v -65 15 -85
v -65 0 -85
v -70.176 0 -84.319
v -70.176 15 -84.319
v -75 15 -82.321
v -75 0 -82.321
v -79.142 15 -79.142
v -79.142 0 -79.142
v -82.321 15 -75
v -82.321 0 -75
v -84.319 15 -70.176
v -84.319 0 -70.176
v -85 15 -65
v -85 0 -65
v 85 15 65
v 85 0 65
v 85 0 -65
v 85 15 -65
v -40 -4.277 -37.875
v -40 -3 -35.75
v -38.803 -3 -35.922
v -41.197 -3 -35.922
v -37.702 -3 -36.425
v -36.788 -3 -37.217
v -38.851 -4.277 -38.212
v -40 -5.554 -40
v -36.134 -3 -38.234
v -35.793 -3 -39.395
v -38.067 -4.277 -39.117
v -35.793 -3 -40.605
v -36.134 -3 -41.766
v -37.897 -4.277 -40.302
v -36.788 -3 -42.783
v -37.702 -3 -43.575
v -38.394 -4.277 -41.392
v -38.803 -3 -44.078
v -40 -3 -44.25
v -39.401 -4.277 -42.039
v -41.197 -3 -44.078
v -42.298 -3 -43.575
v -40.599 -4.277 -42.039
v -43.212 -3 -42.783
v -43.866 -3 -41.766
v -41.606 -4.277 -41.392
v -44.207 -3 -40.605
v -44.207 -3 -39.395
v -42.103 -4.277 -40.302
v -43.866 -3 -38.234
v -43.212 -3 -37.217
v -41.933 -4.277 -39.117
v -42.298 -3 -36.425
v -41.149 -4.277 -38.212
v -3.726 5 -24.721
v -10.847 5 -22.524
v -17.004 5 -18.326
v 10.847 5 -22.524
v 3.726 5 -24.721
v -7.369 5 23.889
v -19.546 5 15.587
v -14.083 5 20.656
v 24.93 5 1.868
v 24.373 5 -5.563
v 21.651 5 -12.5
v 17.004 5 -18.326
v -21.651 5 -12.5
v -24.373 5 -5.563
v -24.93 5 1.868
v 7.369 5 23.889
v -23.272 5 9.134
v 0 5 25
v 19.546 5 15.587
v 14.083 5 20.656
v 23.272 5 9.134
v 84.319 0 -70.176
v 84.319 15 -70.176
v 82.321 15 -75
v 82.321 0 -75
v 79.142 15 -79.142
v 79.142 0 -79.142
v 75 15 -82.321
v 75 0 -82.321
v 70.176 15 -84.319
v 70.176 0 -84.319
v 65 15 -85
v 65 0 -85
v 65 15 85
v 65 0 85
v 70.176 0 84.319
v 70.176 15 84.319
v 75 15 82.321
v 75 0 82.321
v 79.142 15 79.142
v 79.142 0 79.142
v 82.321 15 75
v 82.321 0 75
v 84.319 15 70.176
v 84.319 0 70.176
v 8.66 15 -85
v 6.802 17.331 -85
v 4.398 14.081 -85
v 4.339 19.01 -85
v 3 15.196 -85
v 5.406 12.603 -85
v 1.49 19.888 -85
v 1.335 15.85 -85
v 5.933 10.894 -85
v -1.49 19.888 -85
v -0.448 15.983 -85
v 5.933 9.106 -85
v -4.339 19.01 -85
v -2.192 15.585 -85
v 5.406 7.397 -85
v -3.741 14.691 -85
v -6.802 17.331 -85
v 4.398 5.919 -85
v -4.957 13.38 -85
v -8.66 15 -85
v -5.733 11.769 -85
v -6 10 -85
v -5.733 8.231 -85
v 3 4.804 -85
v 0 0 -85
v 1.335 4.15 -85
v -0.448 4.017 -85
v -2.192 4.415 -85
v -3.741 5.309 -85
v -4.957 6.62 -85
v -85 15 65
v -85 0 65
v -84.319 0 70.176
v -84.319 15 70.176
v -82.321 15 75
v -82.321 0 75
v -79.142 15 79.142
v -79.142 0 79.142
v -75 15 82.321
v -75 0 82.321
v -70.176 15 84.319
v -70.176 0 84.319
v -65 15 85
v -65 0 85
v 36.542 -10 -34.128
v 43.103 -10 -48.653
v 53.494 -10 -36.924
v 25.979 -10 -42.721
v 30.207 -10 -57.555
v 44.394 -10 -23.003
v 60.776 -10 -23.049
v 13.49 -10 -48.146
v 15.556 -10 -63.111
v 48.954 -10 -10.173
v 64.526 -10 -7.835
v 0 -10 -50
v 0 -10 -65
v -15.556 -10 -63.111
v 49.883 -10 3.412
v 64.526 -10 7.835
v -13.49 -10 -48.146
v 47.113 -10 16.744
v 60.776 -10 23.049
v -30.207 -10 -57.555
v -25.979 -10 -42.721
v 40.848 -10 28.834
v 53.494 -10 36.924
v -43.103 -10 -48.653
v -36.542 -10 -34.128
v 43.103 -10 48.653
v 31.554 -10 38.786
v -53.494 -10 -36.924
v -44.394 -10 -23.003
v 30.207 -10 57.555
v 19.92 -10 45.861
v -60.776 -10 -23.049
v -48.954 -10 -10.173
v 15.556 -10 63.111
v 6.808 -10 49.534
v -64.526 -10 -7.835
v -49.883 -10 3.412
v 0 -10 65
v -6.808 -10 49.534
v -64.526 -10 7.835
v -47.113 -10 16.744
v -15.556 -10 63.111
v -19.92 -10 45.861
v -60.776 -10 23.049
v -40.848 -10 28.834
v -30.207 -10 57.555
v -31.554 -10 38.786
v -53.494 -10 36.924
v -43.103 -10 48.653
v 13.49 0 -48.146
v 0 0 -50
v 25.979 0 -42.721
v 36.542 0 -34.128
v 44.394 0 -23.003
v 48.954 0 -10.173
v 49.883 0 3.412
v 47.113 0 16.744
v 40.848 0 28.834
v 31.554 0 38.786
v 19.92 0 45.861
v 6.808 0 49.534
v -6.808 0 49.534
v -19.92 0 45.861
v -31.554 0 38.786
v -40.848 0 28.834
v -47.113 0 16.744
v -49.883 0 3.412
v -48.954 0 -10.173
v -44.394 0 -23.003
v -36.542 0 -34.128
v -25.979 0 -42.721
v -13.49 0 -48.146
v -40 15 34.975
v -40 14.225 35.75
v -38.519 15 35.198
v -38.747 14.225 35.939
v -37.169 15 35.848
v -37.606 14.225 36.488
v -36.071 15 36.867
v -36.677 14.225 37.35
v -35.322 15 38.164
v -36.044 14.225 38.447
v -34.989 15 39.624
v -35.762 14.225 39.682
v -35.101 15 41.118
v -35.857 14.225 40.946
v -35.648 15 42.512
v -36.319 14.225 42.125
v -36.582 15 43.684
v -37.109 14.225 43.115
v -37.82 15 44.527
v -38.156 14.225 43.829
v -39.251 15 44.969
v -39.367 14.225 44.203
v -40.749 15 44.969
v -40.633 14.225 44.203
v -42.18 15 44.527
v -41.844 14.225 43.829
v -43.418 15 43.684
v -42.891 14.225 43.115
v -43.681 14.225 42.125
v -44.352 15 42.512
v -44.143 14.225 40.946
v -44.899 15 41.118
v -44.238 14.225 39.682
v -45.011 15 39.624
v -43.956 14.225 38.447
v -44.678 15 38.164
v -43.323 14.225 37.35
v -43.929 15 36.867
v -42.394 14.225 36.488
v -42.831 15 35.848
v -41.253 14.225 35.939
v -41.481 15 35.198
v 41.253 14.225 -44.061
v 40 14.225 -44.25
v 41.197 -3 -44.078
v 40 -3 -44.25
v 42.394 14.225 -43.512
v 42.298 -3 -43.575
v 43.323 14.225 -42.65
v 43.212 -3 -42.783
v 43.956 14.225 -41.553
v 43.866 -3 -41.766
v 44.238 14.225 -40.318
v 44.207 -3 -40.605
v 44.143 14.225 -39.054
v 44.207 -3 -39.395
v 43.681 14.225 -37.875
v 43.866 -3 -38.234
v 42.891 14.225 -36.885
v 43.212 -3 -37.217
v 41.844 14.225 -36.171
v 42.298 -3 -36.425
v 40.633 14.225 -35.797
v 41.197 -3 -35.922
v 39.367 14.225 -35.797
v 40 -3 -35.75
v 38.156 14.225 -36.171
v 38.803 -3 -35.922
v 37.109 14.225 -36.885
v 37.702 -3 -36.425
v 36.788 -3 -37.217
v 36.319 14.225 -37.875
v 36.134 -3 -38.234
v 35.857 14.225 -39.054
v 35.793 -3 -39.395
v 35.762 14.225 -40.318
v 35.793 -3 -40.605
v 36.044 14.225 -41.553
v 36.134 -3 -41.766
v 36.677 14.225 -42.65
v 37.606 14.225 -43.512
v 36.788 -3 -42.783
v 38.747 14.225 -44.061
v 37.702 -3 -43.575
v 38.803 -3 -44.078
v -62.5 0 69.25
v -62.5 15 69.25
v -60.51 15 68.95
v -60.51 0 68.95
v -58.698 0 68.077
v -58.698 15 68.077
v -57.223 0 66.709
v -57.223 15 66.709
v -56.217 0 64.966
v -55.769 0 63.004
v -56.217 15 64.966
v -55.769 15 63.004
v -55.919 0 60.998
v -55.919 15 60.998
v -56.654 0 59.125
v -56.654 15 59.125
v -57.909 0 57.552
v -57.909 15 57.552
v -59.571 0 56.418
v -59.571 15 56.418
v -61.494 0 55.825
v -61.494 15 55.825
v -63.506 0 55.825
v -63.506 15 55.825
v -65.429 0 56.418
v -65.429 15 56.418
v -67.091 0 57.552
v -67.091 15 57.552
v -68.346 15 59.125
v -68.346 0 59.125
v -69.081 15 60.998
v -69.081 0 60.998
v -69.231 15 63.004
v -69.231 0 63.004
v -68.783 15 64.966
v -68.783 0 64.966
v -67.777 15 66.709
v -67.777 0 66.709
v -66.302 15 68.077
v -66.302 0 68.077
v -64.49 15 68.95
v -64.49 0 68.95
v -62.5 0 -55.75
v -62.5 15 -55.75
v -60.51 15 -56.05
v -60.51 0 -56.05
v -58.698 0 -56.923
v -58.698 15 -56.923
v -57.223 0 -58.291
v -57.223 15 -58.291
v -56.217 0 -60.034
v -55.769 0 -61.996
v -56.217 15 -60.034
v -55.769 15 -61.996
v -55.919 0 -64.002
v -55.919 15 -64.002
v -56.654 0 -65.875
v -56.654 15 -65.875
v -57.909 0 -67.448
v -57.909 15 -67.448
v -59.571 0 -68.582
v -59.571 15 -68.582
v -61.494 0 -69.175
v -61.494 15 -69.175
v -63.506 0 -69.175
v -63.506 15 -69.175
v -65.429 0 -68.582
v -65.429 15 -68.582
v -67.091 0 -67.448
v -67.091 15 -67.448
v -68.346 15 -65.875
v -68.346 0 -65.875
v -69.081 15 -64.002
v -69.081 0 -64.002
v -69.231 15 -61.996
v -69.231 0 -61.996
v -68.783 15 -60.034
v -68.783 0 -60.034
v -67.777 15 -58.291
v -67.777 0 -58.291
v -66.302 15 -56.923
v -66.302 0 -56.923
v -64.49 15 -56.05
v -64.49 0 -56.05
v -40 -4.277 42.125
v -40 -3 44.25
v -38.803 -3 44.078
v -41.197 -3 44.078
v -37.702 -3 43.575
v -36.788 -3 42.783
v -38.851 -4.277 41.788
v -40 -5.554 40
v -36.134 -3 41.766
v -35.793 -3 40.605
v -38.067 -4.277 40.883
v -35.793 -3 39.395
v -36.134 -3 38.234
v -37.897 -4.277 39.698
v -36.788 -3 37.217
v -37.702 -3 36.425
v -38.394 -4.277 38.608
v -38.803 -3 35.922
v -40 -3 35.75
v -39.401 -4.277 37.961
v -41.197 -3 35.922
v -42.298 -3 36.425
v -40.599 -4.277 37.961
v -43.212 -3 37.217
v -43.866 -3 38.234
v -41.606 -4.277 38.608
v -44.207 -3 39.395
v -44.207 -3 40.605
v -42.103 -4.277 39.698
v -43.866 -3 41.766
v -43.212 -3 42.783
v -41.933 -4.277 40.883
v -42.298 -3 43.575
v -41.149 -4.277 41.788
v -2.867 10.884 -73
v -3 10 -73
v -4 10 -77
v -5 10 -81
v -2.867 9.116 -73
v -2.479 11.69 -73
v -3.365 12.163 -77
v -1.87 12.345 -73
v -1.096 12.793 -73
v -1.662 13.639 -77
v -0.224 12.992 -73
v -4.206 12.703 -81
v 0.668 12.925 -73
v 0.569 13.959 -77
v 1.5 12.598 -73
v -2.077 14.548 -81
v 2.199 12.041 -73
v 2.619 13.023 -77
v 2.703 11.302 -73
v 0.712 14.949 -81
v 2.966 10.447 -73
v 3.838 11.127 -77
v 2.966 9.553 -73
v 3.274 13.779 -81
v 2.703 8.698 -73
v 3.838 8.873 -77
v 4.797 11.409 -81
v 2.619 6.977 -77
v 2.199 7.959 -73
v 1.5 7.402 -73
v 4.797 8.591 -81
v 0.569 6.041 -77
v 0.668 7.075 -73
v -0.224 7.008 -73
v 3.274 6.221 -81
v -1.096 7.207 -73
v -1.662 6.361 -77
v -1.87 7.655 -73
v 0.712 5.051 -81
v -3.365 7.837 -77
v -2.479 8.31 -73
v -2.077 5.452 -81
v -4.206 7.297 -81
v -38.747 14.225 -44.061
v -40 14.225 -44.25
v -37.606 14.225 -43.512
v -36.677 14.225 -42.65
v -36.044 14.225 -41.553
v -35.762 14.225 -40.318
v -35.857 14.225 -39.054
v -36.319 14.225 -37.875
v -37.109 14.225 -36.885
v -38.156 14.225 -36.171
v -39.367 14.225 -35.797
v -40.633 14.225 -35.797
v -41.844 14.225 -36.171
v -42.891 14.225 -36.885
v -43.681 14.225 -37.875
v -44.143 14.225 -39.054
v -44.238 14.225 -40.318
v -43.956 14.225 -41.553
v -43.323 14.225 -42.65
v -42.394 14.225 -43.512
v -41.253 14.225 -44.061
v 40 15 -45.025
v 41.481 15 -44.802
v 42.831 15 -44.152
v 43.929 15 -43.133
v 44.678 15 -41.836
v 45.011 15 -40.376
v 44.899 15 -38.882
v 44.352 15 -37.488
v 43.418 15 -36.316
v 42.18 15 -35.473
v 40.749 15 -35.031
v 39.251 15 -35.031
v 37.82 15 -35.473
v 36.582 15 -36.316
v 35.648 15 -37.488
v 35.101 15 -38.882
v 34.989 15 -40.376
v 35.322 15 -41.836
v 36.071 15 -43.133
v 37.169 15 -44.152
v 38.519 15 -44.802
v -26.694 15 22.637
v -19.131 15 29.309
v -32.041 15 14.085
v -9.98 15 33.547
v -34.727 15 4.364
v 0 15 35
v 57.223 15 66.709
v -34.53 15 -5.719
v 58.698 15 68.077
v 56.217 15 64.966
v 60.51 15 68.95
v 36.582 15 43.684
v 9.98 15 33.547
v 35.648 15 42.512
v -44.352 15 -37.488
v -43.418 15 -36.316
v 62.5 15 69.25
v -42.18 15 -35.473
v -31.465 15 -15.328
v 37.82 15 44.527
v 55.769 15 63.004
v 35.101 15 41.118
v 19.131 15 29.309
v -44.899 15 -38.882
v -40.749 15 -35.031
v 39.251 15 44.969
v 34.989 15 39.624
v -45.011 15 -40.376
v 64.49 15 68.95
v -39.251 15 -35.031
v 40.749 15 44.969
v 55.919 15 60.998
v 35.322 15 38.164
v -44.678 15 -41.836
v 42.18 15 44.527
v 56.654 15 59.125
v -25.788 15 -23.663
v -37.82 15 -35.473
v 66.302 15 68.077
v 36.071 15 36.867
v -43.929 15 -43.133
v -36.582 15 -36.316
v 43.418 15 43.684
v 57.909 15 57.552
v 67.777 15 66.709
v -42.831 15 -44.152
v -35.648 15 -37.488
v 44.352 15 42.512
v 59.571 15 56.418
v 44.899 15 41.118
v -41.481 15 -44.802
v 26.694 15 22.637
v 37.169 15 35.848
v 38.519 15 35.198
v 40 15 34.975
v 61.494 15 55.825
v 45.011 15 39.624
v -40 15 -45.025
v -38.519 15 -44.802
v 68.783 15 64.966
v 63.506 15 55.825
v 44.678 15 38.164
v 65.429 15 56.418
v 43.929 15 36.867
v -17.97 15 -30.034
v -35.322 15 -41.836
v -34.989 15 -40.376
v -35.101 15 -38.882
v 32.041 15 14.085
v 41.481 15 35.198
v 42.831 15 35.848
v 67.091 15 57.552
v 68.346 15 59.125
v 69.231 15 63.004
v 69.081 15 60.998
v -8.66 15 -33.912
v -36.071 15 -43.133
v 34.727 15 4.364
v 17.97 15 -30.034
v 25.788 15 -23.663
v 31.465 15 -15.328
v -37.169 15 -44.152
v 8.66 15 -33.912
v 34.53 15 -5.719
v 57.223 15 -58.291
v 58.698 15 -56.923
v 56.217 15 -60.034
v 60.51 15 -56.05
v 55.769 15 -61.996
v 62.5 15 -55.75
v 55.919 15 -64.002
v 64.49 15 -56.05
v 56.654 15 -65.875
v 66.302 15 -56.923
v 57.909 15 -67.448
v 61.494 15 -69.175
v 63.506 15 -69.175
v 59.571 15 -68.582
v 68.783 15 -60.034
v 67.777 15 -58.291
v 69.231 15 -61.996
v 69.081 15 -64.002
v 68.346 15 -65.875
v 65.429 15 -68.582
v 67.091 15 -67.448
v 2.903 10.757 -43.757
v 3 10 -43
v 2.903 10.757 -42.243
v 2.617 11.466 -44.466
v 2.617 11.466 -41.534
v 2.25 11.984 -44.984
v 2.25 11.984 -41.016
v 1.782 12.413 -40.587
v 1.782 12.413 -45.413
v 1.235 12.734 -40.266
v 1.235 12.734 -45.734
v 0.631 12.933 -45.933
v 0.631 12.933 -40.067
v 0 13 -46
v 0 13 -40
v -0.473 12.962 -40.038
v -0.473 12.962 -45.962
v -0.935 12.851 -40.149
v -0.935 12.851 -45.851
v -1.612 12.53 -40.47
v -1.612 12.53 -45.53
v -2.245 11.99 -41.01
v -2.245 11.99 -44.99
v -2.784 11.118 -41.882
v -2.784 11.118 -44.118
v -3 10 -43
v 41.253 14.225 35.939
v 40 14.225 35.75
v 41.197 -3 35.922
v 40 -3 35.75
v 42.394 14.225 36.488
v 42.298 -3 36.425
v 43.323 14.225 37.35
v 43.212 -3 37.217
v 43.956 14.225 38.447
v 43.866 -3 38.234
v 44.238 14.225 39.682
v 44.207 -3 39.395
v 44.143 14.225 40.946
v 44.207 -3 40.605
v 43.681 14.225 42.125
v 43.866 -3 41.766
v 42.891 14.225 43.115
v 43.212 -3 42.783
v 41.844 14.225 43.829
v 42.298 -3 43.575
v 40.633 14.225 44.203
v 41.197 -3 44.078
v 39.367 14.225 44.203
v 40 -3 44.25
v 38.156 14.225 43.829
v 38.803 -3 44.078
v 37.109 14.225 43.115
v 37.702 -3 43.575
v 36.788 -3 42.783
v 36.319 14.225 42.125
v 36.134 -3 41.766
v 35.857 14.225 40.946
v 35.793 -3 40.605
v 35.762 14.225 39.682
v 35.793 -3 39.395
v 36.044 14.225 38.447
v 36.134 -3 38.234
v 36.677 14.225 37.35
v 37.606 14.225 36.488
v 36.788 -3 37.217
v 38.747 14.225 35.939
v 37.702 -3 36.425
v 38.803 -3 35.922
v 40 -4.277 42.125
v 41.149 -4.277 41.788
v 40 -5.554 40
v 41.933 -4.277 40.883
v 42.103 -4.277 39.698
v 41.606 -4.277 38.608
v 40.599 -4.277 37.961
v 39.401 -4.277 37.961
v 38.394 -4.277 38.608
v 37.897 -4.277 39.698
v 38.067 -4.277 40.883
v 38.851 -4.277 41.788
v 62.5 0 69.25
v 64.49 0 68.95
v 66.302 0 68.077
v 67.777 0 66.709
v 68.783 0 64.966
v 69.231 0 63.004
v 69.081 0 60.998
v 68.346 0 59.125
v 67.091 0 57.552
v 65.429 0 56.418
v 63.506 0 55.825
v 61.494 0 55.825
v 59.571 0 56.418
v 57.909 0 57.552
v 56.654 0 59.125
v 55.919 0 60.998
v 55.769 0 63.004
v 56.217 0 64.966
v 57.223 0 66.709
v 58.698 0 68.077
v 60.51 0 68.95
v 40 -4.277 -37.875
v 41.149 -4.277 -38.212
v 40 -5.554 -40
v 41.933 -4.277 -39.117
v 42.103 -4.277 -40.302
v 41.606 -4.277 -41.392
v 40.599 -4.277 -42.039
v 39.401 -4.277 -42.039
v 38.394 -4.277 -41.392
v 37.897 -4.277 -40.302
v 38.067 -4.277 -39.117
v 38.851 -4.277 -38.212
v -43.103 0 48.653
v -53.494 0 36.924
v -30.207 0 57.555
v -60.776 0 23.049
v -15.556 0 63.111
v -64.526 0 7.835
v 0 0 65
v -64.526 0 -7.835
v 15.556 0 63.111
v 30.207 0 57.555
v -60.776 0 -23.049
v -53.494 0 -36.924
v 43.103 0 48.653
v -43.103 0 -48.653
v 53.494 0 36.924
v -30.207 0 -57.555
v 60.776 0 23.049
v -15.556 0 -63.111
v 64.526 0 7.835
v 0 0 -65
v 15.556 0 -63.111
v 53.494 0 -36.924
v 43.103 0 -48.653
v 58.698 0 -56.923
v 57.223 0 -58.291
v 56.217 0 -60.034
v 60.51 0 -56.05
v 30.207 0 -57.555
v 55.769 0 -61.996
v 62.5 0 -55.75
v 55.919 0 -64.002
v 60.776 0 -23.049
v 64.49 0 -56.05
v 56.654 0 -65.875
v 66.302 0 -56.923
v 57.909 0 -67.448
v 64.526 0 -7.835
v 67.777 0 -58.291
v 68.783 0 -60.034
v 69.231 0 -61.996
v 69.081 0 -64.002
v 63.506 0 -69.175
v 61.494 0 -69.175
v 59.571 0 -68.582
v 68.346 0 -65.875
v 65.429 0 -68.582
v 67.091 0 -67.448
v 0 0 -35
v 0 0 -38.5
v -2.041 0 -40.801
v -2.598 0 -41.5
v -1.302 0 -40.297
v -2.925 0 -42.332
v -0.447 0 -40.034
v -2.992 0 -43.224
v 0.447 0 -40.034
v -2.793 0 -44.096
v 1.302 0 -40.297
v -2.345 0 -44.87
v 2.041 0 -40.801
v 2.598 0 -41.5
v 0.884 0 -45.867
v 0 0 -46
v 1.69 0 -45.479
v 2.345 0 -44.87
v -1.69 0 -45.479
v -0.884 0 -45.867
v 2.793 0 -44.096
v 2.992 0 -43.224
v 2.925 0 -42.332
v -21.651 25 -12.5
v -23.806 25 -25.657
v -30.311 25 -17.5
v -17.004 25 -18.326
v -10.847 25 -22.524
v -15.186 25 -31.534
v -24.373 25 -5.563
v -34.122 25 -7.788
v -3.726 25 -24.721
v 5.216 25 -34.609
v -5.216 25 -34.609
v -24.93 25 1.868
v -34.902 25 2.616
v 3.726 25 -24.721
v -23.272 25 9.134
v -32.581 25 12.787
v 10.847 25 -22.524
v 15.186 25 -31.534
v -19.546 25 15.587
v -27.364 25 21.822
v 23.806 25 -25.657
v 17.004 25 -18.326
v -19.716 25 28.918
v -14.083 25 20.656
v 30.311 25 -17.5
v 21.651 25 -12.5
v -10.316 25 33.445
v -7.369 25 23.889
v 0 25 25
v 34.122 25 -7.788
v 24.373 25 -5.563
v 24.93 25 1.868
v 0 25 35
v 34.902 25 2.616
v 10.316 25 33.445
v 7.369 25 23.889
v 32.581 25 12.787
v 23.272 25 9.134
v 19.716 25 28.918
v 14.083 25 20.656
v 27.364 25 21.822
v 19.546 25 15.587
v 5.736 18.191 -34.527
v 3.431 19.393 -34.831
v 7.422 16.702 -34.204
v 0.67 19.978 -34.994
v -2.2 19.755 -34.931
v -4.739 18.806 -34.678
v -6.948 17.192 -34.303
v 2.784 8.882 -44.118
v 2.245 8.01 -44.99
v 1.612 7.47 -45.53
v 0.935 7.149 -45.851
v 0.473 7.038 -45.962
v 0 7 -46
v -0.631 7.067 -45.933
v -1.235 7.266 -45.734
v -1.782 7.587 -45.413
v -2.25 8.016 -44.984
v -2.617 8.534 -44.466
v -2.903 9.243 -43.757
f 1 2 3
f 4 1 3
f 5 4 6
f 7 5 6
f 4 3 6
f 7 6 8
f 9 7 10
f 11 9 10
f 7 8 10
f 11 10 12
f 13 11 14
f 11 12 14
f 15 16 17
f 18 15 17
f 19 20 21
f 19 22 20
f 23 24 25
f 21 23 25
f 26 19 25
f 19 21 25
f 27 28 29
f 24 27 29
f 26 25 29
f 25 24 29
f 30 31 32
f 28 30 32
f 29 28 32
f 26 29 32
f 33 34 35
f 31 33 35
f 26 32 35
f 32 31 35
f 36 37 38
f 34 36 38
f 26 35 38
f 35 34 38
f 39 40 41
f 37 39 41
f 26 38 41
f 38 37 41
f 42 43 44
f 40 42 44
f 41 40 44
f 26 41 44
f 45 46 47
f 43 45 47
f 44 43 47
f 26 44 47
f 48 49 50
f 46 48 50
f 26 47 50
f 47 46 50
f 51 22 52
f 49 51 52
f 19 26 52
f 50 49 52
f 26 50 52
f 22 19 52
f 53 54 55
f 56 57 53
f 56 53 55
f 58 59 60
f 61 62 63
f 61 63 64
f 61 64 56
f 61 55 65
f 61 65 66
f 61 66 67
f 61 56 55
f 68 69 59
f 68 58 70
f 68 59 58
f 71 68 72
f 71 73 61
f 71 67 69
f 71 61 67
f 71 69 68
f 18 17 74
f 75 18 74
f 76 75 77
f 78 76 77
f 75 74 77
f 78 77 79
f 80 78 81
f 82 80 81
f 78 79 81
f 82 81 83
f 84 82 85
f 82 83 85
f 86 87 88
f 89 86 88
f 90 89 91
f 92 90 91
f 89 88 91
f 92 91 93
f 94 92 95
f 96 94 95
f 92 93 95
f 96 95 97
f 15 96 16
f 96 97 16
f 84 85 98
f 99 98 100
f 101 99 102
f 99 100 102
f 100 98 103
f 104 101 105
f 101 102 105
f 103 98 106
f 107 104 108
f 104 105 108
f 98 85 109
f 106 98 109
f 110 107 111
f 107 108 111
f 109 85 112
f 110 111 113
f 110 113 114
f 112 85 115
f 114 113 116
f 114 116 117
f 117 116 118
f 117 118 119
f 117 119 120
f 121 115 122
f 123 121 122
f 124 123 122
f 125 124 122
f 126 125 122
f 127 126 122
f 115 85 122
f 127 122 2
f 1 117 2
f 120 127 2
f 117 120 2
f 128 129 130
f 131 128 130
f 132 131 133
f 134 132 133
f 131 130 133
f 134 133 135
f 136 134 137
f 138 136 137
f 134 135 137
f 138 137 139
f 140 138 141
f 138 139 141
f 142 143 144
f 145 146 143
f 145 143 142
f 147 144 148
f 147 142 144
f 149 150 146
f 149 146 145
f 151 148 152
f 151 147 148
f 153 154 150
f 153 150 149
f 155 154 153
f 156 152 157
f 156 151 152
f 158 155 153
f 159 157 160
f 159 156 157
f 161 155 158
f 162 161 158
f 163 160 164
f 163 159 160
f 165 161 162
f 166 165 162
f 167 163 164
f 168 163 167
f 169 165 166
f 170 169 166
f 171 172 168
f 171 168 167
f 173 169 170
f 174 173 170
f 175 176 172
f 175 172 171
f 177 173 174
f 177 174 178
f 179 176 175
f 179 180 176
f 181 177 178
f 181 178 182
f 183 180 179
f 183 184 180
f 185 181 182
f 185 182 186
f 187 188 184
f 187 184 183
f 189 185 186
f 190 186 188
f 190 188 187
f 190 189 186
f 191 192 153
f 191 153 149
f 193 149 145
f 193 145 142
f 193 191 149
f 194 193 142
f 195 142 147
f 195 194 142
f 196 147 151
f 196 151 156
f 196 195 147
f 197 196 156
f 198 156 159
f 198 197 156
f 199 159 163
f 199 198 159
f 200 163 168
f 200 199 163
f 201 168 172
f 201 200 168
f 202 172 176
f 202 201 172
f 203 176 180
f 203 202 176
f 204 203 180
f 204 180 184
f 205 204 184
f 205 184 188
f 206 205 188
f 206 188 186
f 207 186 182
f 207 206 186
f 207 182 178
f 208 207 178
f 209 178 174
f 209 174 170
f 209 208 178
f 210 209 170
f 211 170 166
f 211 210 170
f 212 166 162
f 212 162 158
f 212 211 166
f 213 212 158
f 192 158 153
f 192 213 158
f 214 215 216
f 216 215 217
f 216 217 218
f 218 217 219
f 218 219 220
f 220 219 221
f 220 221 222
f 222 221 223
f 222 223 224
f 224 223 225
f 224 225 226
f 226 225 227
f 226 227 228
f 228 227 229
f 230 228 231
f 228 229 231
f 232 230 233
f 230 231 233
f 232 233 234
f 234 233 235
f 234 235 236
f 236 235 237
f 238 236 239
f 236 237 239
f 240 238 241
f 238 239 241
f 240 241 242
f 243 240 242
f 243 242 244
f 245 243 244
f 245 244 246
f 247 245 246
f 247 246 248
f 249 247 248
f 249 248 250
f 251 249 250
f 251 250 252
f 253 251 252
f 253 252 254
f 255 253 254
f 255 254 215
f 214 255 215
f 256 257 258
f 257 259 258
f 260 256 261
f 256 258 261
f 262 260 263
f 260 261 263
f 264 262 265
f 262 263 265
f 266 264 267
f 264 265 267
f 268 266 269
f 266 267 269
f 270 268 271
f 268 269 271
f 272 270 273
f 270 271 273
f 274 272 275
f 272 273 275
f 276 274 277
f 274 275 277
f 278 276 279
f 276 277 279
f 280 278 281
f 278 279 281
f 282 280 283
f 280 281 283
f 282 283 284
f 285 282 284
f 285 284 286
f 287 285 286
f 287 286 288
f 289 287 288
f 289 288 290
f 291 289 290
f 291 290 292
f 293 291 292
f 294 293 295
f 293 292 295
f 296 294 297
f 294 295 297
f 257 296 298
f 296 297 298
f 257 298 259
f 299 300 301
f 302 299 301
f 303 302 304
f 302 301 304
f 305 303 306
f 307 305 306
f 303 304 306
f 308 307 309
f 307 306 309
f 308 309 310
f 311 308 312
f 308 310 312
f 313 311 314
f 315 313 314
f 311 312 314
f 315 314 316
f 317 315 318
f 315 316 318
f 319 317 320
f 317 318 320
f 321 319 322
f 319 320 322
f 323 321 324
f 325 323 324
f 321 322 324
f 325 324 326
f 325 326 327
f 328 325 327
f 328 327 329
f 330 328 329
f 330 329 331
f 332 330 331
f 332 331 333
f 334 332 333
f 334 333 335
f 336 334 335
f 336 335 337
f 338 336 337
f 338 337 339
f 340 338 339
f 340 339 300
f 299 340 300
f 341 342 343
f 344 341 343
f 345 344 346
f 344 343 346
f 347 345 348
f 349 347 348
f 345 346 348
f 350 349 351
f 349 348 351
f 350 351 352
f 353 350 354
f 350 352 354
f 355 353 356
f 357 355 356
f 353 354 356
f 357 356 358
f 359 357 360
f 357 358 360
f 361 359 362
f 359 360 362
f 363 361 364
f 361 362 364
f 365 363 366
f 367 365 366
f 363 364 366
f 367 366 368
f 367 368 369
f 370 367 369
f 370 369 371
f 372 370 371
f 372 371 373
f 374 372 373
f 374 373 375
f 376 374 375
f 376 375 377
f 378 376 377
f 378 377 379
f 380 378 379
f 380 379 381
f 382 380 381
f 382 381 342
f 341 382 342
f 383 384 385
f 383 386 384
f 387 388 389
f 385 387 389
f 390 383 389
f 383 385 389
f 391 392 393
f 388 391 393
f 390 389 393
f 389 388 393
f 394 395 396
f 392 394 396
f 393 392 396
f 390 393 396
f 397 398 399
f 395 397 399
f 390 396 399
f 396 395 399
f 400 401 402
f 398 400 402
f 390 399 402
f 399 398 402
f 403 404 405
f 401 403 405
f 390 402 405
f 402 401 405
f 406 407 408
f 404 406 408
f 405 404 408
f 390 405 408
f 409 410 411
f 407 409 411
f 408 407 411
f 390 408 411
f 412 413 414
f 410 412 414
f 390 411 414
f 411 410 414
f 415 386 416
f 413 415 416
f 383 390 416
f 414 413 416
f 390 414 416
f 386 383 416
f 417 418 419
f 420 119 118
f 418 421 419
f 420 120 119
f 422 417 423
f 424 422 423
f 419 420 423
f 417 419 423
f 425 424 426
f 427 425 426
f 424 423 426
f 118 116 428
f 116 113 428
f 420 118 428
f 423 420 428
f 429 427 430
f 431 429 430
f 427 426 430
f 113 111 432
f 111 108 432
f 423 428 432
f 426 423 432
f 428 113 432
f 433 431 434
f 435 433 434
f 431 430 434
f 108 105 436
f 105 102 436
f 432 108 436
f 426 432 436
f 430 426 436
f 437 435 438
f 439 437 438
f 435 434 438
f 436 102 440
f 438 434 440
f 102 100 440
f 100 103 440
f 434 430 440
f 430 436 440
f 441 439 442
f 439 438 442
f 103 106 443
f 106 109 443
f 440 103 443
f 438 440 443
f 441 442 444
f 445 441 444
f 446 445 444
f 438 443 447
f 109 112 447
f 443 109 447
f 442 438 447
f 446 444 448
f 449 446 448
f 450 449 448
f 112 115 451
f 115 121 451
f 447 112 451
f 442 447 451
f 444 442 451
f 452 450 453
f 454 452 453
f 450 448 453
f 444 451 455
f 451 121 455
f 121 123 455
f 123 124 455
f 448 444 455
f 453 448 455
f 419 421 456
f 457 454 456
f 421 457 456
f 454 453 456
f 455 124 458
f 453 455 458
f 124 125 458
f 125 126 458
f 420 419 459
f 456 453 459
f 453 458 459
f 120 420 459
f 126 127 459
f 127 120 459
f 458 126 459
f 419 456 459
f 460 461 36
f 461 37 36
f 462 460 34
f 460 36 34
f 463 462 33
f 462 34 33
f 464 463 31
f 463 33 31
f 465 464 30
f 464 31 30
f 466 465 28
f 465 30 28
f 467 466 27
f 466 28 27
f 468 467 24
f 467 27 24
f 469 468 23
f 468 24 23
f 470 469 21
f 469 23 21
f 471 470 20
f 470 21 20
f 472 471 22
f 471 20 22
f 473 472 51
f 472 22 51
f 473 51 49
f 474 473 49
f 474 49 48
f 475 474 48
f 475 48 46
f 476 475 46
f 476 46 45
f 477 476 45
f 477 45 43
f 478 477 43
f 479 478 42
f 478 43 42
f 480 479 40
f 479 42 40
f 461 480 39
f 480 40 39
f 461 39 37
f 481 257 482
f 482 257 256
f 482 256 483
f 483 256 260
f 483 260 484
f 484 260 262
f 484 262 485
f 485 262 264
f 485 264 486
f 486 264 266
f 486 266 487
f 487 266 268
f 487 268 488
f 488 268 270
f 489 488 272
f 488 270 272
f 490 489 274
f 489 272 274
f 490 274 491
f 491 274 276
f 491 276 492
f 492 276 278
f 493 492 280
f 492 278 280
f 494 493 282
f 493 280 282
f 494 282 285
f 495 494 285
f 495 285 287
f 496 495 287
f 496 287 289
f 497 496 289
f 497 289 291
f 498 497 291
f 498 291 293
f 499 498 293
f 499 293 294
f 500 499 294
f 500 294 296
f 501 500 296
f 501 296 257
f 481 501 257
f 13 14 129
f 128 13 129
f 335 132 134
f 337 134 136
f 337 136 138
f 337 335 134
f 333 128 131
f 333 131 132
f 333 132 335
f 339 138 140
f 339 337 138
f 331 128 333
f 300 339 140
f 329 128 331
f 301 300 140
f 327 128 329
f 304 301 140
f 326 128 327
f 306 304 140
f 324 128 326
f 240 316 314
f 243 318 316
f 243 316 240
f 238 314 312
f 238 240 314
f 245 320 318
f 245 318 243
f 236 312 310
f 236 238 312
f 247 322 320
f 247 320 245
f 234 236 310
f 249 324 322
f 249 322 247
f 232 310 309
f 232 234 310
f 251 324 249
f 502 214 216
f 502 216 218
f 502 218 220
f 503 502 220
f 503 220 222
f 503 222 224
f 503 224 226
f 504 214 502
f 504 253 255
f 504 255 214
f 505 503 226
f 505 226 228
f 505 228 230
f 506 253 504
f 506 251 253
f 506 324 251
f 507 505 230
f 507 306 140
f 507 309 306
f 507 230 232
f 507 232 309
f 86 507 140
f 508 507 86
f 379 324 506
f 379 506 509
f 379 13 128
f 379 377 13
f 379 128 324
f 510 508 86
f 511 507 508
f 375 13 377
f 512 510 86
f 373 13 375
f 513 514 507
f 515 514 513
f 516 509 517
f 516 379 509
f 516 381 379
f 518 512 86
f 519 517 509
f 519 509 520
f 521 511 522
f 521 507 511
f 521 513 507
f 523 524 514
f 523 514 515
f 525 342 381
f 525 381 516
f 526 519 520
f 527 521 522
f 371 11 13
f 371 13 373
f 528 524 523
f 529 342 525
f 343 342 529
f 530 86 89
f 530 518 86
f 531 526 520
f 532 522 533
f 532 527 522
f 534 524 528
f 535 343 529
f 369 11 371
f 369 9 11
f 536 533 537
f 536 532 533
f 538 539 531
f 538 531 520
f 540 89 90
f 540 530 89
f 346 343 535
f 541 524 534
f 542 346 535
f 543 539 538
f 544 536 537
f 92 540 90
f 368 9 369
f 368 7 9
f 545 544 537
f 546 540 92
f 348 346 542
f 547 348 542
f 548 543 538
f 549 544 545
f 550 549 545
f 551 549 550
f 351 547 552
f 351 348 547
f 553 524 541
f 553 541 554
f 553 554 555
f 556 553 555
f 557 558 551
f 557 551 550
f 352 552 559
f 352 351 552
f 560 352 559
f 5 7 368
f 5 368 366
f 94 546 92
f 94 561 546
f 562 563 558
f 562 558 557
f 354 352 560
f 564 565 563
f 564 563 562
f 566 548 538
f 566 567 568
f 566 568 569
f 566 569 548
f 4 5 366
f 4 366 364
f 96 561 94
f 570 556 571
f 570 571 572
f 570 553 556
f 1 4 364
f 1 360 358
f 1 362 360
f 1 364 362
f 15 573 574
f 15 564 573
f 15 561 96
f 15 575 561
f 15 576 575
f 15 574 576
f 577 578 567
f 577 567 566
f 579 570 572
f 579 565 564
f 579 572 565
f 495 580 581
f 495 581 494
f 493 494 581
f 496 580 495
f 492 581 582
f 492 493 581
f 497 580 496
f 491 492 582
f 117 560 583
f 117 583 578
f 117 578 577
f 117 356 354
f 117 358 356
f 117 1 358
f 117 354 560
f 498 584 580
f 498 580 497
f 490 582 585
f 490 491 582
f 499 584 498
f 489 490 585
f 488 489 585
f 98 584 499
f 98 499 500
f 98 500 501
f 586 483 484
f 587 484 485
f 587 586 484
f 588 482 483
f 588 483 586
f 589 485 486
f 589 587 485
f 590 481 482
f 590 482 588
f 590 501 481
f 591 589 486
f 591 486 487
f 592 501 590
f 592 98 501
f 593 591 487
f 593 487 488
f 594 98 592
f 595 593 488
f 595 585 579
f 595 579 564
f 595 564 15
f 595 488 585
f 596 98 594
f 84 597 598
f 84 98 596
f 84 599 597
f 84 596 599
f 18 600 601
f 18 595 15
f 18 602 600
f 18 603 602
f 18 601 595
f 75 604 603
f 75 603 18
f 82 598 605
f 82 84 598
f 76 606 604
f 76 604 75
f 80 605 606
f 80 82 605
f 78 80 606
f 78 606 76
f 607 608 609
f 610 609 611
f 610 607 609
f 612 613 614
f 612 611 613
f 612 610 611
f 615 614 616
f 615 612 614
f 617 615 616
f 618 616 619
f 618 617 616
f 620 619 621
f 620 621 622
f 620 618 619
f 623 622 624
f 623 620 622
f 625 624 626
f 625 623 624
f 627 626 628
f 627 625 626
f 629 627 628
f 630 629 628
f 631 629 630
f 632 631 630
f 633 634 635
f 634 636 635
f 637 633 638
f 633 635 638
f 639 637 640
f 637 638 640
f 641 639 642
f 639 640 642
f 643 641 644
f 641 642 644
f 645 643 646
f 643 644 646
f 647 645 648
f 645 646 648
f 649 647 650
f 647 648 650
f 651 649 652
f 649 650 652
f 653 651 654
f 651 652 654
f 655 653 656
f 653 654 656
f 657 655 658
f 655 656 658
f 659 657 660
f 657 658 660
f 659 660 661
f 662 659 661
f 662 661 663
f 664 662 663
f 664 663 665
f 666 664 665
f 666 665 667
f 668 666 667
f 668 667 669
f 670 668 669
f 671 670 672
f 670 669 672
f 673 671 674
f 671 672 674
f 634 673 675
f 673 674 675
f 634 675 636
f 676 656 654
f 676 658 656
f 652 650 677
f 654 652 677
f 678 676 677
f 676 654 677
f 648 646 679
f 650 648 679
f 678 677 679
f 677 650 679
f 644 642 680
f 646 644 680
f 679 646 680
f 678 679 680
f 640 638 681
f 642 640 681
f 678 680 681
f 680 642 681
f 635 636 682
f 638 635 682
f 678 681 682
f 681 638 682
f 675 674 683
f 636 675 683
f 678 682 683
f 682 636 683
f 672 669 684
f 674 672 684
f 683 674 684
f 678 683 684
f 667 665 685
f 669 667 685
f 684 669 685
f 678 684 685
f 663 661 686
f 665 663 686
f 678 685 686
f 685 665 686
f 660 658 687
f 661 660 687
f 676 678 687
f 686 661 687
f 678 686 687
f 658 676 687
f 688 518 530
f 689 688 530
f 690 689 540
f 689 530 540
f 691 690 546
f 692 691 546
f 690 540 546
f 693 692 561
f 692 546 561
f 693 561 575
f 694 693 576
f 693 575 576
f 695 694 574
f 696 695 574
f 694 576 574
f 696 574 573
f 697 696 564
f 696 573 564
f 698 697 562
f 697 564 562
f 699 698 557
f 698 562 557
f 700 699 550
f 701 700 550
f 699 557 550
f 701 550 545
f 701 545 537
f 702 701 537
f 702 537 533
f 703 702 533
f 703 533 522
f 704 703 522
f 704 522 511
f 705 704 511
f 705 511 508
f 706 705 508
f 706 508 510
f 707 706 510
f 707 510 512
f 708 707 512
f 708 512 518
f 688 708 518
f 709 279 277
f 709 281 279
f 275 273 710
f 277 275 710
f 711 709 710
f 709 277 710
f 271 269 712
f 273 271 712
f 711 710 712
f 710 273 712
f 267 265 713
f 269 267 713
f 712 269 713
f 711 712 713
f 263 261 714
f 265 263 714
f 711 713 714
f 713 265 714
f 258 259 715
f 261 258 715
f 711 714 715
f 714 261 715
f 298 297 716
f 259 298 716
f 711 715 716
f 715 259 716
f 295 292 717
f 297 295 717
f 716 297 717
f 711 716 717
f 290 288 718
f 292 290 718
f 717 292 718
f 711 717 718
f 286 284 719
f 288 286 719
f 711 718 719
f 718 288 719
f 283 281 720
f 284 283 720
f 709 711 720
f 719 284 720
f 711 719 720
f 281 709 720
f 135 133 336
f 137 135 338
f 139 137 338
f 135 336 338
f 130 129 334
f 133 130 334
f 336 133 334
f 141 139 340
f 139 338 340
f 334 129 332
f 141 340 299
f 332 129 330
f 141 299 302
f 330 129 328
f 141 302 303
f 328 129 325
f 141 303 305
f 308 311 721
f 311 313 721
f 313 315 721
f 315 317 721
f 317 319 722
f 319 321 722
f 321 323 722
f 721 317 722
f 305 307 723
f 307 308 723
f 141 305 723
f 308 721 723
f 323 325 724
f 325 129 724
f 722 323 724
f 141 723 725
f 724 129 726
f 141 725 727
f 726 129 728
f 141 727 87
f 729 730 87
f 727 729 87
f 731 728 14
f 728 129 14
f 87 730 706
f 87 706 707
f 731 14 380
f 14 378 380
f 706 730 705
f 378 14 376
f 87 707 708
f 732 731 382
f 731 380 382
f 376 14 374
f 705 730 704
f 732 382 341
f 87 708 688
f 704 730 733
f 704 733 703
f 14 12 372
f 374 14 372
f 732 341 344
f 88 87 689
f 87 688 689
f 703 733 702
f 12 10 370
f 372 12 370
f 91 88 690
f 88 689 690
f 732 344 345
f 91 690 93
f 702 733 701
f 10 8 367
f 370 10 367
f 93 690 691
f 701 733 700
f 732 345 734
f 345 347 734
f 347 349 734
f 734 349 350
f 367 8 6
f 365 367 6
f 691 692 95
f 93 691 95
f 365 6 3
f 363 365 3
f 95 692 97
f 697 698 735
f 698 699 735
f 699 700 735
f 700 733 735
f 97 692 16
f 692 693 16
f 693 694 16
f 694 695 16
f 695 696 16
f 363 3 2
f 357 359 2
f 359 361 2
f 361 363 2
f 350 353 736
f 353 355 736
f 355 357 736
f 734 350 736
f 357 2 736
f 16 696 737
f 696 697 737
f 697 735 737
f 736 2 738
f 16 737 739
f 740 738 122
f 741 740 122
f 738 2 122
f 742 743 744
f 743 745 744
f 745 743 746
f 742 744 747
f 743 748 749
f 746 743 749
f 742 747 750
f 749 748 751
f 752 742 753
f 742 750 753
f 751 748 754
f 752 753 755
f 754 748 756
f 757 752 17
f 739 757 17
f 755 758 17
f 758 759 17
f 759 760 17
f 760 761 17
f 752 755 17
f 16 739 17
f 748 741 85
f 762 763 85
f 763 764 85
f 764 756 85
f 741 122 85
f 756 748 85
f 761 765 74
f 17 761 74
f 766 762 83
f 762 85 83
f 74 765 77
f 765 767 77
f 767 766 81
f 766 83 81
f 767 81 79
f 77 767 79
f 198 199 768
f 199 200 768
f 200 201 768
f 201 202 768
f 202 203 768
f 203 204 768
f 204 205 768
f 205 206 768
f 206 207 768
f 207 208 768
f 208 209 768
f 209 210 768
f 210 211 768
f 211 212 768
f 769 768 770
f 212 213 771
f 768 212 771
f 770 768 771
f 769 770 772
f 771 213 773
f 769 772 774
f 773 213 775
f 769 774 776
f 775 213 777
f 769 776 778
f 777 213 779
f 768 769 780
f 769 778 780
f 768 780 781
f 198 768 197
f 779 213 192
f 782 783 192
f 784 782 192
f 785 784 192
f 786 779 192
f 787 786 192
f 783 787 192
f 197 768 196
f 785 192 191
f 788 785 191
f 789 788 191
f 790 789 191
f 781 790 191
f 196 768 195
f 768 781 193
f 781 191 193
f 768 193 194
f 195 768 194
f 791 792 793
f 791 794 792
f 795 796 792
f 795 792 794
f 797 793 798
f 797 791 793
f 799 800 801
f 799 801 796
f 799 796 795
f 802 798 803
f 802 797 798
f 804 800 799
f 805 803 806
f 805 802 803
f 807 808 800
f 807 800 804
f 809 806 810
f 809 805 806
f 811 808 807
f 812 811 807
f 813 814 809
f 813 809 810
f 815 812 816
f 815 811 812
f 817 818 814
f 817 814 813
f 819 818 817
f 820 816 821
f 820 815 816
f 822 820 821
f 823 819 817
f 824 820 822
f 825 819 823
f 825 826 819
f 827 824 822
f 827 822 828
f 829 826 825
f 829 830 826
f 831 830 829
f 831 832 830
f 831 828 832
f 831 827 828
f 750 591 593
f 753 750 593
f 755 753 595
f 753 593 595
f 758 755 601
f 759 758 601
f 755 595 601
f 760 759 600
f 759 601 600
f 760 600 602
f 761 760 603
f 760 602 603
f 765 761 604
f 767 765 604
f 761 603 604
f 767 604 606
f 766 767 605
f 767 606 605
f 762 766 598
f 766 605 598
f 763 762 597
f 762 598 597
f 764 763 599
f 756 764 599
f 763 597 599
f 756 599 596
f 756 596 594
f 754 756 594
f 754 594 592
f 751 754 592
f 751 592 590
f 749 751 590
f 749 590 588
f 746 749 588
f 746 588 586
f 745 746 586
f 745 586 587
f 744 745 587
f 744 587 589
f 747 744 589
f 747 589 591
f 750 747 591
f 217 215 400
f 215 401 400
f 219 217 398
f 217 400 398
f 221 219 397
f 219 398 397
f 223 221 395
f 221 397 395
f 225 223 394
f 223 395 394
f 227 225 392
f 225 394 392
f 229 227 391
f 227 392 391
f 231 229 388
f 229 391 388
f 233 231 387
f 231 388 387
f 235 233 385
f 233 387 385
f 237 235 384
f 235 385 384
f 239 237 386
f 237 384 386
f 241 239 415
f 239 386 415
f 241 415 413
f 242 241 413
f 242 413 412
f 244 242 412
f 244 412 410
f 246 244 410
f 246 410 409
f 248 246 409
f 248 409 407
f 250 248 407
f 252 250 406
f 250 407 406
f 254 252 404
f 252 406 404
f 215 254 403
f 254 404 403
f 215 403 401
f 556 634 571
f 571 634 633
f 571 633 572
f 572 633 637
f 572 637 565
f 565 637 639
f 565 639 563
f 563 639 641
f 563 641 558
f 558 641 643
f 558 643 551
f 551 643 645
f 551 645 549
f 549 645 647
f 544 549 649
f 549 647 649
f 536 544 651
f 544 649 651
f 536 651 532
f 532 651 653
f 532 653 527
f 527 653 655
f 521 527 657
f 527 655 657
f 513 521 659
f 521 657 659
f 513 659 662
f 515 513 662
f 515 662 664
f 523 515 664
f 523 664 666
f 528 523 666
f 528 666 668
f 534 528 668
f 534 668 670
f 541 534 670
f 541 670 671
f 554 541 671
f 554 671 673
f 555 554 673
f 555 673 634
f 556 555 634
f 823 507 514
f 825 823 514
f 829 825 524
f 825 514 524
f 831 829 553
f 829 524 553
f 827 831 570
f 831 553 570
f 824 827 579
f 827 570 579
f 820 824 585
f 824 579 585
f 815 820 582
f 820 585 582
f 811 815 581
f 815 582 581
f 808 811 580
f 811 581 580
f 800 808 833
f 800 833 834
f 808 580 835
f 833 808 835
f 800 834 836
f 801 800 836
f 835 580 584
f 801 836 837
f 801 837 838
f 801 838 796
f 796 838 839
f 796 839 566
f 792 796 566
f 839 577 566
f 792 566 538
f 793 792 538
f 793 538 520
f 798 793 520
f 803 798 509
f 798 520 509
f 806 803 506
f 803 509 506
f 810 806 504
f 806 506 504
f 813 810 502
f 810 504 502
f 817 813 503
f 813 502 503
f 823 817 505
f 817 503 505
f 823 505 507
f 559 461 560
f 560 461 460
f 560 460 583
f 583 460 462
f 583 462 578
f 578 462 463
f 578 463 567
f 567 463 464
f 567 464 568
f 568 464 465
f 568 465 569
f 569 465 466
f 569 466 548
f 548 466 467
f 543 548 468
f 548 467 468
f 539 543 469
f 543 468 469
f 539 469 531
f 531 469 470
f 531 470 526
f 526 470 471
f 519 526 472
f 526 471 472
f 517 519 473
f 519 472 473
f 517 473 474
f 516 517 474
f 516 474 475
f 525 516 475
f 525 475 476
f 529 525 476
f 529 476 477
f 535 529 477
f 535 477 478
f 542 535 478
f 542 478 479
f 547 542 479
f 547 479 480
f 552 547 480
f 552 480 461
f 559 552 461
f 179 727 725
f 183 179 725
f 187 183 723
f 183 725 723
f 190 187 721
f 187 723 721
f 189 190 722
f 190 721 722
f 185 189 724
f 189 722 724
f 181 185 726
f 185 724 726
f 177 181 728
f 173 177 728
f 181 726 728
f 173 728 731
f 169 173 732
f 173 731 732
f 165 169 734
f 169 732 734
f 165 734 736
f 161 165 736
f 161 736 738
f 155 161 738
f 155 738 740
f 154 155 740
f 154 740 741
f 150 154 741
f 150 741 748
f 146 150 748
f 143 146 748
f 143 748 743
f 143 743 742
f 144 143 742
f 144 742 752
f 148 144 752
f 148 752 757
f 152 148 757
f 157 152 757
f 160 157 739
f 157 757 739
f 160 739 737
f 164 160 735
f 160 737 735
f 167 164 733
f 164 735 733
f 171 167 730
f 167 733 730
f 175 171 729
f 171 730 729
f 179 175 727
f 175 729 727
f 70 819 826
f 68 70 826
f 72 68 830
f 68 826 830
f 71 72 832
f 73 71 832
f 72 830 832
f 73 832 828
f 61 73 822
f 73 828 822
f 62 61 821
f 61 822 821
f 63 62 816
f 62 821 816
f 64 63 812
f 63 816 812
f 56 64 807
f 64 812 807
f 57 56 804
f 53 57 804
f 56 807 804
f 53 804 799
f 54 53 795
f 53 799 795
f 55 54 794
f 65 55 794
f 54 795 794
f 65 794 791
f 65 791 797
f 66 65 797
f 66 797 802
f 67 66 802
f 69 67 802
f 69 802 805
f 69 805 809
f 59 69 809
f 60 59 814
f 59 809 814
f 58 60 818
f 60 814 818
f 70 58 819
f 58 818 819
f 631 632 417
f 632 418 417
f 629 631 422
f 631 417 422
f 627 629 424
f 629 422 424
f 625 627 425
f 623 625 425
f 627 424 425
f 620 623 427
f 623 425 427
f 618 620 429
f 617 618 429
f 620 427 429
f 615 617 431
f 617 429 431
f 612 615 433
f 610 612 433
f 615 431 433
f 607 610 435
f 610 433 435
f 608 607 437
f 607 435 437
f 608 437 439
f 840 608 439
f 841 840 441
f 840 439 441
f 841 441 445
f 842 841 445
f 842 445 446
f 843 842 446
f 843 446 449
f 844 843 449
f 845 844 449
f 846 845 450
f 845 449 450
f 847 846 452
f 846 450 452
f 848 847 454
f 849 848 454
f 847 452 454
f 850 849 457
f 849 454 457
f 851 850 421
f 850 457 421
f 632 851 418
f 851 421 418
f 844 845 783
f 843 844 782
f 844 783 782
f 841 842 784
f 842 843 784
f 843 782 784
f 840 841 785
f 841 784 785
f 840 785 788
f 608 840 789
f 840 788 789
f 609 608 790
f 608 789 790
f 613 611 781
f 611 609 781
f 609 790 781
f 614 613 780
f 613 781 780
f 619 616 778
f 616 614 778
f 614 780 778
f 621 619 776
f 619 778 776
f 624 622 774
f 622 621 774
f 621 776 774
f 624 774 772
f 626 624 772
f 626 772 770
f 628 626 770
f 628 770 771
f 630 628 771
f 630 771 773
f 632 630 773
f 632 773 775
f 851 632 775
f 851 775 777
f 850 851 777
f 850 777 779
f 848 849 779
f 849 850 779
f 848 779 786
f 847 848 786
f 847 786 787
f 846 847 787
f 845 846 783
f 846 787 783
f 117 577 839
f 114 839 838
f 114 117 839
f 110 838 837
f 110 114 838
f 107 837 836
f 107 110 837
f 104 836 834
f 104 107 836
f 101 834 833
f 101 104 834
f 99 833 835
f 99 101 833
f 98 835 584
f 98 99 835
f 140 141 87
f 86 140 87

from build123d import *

# Parameters (mm, degrees)
EXTRUDE_1_DEPTH      = 15
SKETCH_2_R           = 35
EXTRUDE_2_DEPTH      = 10
SKETCH_3_R           = 65
SKETCH_3_R_2         = 50
EXTRUDE_3_DEPTH      = 10
SKETCH_4_R           = 25
CUT_EXTRUDE_1_DEPTH  = 20
CUT_EXTRUDE_2_REACH  = 124.78
SKETCH_5_R           = 6.75
EXTRUDE_4_REACH      = 193.703
EXTRUDE_4_END_RADIUS = 35
SKETCH_9_R           = 10
SKETCH_11_R          = 3
SKETCH_10_R          = 6
SKETCH_12_R          = 3
CUT_EXTRUDE_4_DEPTH  = 33
SKETCH_13_R          = 3
CUT_EXTRUDE_5_DEPTH  = 13
EXTRUDE_START        = 6
EXTRUDE_5_DEPTH      = 6
EXTRUDE_6_DEPTH      = 13
M10X1_52_D           = 8.5
M10X1_52_DEPTH       = 18
M10X1_52_CSINK_D     = 10.05
M10X1_52_CSINK_ANGLE = 90
M10X1_52_TIP         = 2.553657631


with BuildPart() as part:
    # Эскиз1 → Бобышка-Вытянуть1 (new body)
    with BuildSketch(Plane(origin=(0, 0, 0), x_dir=(1, 0, 0), z_dir=(0, 1, 0))):
        with BuildLine():
            Line((-65, -85), (65, -85))
            ThreePointArc((65, -85), (79.142135624, -79.142135624), (85, -65))
            Line((85, -65), (85, 65))
            ThreePointArc((85, 65), (79.142135624, 79.142135624), (65, 85))
            Line((65, 85), (-65, 85))
            ThreePointArc((-65, 85), (-79.142135624, 79.142135624), (-85, 65))
            Line((-85, 65), (-85, -65))
            ThreePointArc((-85, -65), (-79.142135624, -79.142135624), (-65, -85))
        make_face()
    extrude(amount=EXTRUDE_1_DEPTH)

    # Эскиз2 → Бобышка-Вытянуть2 (add)
    with BuildSketch(Plane(origin=(0, 15, 0), x_dir=(1, 0, 0), z_dir=(0, 1, 0))):
        with Locations(Location((0, 0, 0), (0, 0, 270))):
            Circle(SKETCH_2_R)
    extrude(amount=EXTRUDE_2_DEPTH)

    # Эскиз3 → Бобышка-Вытянуть3 (add)
    with BuildSketch(Plane.XZ):
        with Locations(Location((0, 0, 0), (0, 0, 90))):
            Circle(SKETCH_3_R)
        with Locations(Location((0, 0, 0), (0, 0, 270))):
            Circle(SKETCH_3_R_2, mode=Mode.SUBTRACT)
    extrude(amount=EXTRUDE_3_DEPTH)

    # Эскиз4 → Вырез-Вытянуть1 (cut)
    with BuildSketch(Plane(origin=(0, 25, 0), x_dir=(1, 0, 0), z_dir=(0, 1, 0))):
        with Locations(Location((0, 0, 0), (0, 0, 270))):
            Circle(SKETCH_4_R)
    extrude(amount=-CUT_EXTRUDE_1_DEPTH, mode=Mode.SUBTRACT)

    # Эскиз5 → Вырез-Вытянуть2 (cut, up to next)
    with BuildSketch(Plane(origin=(0, 15, 0), x_dir=(1, 0, 0), z_dir=(0, 1, 0)), mode=Mode.PRIVATE) as cut_extrude_2_sk1:
        with Locations(Location((-62.5, 62.5, 0), (0, 0, 270))):
            Circle(SKETCH_5_R)
    cut_extrude_2_tool1 = extrude(cut_extrude_2_sk1.sketch, amount=-CUT_EXTRUDE_2_REACH, mode=Mode.PRIVATE) & part.part
    # Эскиз5 → Вырез-Вытянуть2 (cut, up to next)
    with BuildSketch(Plane(origin=(0, 15, 0), x_dir=(1, 0, 0), z_dir=(0, 1, 0)), mode=Mode.PRIVATE) as cut_extrude_2_sk2:
        with Locations(Location((62.5, 62.5, 0), (0, 0, 270))):
            Circle(SKETCH_5_R)
    cut_extrude_2_tool2 = extrude(cut_extrude_2_sk2.sketch, amount=-CUT_EXTRUDE_2_REACH, mode=Mode.PRIVATE) & part.part
    # Эскиз5 → Вырез-Вытянуть2 (cut, up to next)
    with BuildSketch(Plane(origin=(0, 15, 0), x_dir=(1, 0, 0), z_dir=(0, 1, 0)), mode=Mode.PRIVATE) as cut_extrude_2_sk3:
        with Locations(Location((62.5, -62.5, 0), (0, 0, 270))):
            Circle(SKETCH_5_R)
    cut_extrude_2_tool3 = extrude(cut_extrude_2_sk3.sketch, amount=-CUT_EXTRUDE_2_REACH, mode=Mode.PRIVATE) & part.part
    # Эскиз5 → Вырез-Вытянуть2 (cut, up to next)
    with BuildSketch(Plane(origin=(0, 15, 0), x_dir=(1, 0, 0), z_dir=(0, 1, 0)), mode=Mode.PRIVATE) as cut_extrude_2_sk4:
        with Locations(Location((-62.5, -62.5, 0), (0, 0, 270))):
            Circle(SKETCH_5_R)
    cut_extrude_2_tool4 = extrude(cut_extrude_2_sk4.sketch, amount=-CUT_EXTRUDE_2_REACH, mode=Mode.PRIVATE) & part.part
    add(cut_extrude_2_tool1.solids().sort_by_distance((-62.5, 15, -62.5))[0], mode=Mode.SUBTRACT)
    add(cut_extrude_2_tool2.solids().sort_by_distance((62.5, 15, -62.5))[0], mode=Mode.SUBTRACT)
    add(cut_extrude_2_tool3.solids().sort_by_distance((62.5, 15, 62.5))[0], mode=Mode.SUBTRACT)
    add(cut_extrude_2_tool4.solids().sort_by_distance((-62.5, 15, 62.5))[0], mode=Mode.SUBTRACT)

    # Бобышка-Вытянуть4: up to this cylinder (the profile starts outside it)
    extrude_4_end = Plane(origin=(0, 10, 0), z_dir=(0, -1, 0)) * Cylinder(EXTRUDE_4_END_RADIUS, 458.406, mode=Mode.PRIVATE)
    # Эскиз9 → Бобышка-Вытянуть4 (add, up to the surface)
    with BuildSketch(Plane(origin=(0, 0, -85), x_dir=(-1, 0, 0), z_dir=(0, 0, -1)), mode=Mode.PRIVATE) as extrude_4_sk1:
        with Locations((0, 10)):
            Circle(SKETCH_9_R)
    extrude_4_tool1 = extrude(extrude_4_sk1.sketch, amount=-EXTRUDE_4_REACH, mode=Mode.PRIVATE) - extrude_4_end
    add(extrude_4_tool1.solids().sort_by_distance((0, 10, -85))[0])

    # Эскиз11 → Вырез-По сечениям1 section 0
    with BuildSketch(Plane(origin=(0, 0, -73), x_dir=(-1, 0, 0), z_dir=(0, 0, -1))):
        with Locations((0, 10)):
            Circle(SKETCH_11_R)
    # Эскиз10 → Вырез-По сечениям1 section 1
    with BuildSketch(Plane(origin=(0, 0, -85), x_dir=(-1, 0, 0), z_dir=(0, 0, -1))):
        with Locations((0, 10)):
            Circle(SKETCH_10_R)
    loft(mode=Mode.SUBTRACT)

    # Эскиз12 → Вырез-Вытянуть4 (cut)
    with BuildSketch(Plane(origin=(0, 0, -73), x_dir=(-1, 0, 0), z_dir=(0, 0, -1))):
        with Locations((0, 10)):
            Circle(SKETCH_12_R)
    extrude(amount=-CUT_EXTRUDE_4_DEPTH, mode=Mode.SUBTRACT)

    # Эскиз13 → Вырез-Вытянуть5 (cut)
    with BuildSketch(Plane.XZ):
        with Locations(Location((0, -43, 0), (0, 0, 270))):
            Circle(SKETCH_13_R)
    extrude(amount=-CUT_EXTRUDE_5_DEPTH, mode=Mode.SUBTRACT)

    # Эскиз14 → Бобышка-Вытянуть5 (add)
    with BuildSketch(Plane(origin=(0, 0, -40), x_dir=(-1, 0, 0), z_dir=(0, 0, -1)).offset(EXTRUDE_START)):
        with BuildLine():
            Line((3, 10), (4.5, 10))
            ThreePointArc((4.5, 10), (0, 14.5), (-4.5, 10))
            Line((-4.5, 10), (-3, 10))
            ThreePointArc((-3, 10), (0, 13), (3, 10))
        make_face()
    extrude(amount=-EXTRUDE_5_DEPTH)

    # Эскиз15 → Бобышка-Вытянуть6 (add)
    with BuildSketch(Plane.XZ):
        with BuildLine():
            Line((-3, -43), (-4.5, -43))
            ThreePointArc((-4.5, -43), (0, -38.5), (4.5, -43))
            Line((4.5, -43), (3, -43))
            ThreePointArc((3, -43), (0, -40), (-3, -43))
        make_face()
    extrude(amount=-EXTRUDE_6_DEPTH)

    # Отверстие обработанное метчиком M10x1.52
    with Locations(Plane(origin=(-40, 15, -40), x_dir=(0, 0, 1), z_dir=(0, 1, 0))):
        with Locations((0, 0), (0, 80), (80, 80), (80, 0)):
            CounterSinkHole(M10X1_52_D / 2, M10X1_52_CSINK_D / 2, depth=M10X1_52_DEPTH, counter_sink_angle=M10X1_52_CSINK_ANGLE)
            with Locations((0, 0, -(M10X1_52_DEPTH + M10X1_52_TIP / 2))):  # 118° drill point
                Cone(0, M10X1_52_D / 2, M10X1_52_TIP, mode=Mode.SUBTRACT)


solid = part.part
